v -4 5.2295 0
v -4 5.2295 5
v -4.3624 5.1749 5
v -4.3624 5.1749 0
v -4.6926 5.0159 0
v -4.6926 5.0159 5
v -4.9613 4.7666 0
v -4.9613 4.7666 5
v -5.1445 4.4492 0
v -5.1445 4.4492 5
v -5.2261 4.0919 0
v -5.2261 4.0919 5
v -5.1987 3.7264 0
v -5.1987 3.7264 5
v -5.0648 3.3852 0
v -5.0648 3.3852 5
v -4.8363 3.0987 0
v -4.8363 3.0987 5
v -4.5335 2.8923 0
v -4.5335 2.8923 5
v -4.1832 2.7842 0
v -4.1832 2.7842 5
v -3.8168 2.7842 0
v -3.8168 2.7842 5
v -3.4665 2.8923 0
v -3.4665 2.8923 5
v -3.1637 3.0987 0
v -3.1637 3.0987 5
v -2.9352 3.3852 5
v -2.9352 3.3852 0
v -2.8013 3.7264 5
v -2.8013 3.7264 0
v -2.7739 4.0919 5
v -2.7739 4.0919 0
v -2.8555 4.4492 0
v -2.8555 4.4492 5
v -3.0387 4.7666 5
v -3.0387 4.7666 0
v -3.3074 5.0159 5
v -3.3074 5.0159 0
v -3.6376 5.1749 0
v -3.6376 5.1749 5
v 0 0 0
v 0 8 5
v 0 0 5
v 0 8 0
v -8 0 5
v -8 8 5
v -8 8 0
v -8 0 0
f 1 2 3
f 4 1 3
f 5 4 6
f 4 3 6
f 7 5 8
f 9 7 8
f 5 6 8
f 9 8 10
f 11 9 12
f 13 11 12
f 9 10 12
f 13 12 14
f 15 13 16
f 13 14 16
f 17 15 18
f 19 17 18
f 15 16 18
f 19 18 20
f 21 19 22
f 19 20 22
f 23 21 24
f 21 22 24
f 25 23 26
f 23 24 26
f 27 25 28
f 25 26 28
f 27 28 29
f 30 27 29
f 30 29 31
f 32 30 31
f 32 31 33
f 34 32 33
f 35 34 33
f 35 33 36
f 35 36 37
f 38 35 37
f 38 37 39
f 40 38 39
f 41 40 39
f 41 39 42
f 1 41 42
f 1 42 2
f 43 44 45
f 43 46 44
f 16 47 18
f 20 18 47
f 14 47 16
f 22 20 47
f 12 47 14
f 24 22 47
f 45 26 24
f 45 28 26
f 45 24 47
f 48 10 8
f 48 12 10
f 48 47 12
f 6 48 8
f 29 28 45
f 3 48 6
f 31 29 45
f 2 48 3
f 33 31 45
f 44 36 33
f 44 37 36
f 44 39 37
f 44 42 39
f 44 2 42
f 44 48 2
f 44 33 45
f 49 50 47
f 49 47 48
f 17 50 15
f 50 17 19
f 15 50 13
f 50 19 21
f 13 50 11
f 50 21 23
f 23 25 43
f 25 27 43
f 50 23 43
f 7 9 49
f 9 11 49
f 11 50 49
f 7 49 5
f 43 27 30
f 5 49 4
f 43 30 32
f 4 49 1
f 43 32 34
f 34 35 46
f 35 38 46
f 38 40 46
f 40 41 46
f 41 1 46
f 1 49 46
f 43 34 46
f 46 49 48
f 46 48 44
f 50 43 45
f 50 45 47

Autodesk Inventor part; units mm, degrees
ref_plane "YZ Plane" through (0, 0, 0) normal (1, 0, 0) x (0, 1, 0)
ref_plane "XZ Plane" through (0, 0, 0) normal (0, 1, 0) x (-1, 0, 0)
ref_plane "XY Plane" through (0, 0, 0) normal (0, 0, 1) x (1, 0, 0)
sketch "Szkic1" plane through (0, 0, 0) normal (0, 0, 1) x (1, 0, 0)
  line L0 (0, 0) -> (-8, 0)
  line L1 (-8, 0) -> (-8, 8)
  line L2 (-8, 8) -> (0, 8)
  line L3 (0, 8) -> (0, 0)
  dimension "d0" = 8
  dimension "d1" = 8
extrude "Wyciągnięcie proste1" add sketch "Szkic1" along normal blind 5
sketch "Szkic2" plane through (0, 0, 0) normal (0, 0, -1) x (-1, 0, 0)
  line L0 (0, 8) -> (8, 8) projected
  line L1 (4, 8) -> (4, 0)
  line L2 (8, 0) -> (0, 0) projected
  line L3 (0, 0) -> (0, 8) projected
  line L4 (0, 4) -> (8, 4)
  line L5 (8, 8) -> (8, 0) projected
  point P0 (4, 4)
hole "Otwór1" at (-4, 4, 0) direction (0, 0, 1) diameter 2.459 end through all thread size "M3x0.5" class "6H" standard "ISO Metric profile"
properties part number "zatyczka na szyne" material "Stal nierdzewna 440C"
